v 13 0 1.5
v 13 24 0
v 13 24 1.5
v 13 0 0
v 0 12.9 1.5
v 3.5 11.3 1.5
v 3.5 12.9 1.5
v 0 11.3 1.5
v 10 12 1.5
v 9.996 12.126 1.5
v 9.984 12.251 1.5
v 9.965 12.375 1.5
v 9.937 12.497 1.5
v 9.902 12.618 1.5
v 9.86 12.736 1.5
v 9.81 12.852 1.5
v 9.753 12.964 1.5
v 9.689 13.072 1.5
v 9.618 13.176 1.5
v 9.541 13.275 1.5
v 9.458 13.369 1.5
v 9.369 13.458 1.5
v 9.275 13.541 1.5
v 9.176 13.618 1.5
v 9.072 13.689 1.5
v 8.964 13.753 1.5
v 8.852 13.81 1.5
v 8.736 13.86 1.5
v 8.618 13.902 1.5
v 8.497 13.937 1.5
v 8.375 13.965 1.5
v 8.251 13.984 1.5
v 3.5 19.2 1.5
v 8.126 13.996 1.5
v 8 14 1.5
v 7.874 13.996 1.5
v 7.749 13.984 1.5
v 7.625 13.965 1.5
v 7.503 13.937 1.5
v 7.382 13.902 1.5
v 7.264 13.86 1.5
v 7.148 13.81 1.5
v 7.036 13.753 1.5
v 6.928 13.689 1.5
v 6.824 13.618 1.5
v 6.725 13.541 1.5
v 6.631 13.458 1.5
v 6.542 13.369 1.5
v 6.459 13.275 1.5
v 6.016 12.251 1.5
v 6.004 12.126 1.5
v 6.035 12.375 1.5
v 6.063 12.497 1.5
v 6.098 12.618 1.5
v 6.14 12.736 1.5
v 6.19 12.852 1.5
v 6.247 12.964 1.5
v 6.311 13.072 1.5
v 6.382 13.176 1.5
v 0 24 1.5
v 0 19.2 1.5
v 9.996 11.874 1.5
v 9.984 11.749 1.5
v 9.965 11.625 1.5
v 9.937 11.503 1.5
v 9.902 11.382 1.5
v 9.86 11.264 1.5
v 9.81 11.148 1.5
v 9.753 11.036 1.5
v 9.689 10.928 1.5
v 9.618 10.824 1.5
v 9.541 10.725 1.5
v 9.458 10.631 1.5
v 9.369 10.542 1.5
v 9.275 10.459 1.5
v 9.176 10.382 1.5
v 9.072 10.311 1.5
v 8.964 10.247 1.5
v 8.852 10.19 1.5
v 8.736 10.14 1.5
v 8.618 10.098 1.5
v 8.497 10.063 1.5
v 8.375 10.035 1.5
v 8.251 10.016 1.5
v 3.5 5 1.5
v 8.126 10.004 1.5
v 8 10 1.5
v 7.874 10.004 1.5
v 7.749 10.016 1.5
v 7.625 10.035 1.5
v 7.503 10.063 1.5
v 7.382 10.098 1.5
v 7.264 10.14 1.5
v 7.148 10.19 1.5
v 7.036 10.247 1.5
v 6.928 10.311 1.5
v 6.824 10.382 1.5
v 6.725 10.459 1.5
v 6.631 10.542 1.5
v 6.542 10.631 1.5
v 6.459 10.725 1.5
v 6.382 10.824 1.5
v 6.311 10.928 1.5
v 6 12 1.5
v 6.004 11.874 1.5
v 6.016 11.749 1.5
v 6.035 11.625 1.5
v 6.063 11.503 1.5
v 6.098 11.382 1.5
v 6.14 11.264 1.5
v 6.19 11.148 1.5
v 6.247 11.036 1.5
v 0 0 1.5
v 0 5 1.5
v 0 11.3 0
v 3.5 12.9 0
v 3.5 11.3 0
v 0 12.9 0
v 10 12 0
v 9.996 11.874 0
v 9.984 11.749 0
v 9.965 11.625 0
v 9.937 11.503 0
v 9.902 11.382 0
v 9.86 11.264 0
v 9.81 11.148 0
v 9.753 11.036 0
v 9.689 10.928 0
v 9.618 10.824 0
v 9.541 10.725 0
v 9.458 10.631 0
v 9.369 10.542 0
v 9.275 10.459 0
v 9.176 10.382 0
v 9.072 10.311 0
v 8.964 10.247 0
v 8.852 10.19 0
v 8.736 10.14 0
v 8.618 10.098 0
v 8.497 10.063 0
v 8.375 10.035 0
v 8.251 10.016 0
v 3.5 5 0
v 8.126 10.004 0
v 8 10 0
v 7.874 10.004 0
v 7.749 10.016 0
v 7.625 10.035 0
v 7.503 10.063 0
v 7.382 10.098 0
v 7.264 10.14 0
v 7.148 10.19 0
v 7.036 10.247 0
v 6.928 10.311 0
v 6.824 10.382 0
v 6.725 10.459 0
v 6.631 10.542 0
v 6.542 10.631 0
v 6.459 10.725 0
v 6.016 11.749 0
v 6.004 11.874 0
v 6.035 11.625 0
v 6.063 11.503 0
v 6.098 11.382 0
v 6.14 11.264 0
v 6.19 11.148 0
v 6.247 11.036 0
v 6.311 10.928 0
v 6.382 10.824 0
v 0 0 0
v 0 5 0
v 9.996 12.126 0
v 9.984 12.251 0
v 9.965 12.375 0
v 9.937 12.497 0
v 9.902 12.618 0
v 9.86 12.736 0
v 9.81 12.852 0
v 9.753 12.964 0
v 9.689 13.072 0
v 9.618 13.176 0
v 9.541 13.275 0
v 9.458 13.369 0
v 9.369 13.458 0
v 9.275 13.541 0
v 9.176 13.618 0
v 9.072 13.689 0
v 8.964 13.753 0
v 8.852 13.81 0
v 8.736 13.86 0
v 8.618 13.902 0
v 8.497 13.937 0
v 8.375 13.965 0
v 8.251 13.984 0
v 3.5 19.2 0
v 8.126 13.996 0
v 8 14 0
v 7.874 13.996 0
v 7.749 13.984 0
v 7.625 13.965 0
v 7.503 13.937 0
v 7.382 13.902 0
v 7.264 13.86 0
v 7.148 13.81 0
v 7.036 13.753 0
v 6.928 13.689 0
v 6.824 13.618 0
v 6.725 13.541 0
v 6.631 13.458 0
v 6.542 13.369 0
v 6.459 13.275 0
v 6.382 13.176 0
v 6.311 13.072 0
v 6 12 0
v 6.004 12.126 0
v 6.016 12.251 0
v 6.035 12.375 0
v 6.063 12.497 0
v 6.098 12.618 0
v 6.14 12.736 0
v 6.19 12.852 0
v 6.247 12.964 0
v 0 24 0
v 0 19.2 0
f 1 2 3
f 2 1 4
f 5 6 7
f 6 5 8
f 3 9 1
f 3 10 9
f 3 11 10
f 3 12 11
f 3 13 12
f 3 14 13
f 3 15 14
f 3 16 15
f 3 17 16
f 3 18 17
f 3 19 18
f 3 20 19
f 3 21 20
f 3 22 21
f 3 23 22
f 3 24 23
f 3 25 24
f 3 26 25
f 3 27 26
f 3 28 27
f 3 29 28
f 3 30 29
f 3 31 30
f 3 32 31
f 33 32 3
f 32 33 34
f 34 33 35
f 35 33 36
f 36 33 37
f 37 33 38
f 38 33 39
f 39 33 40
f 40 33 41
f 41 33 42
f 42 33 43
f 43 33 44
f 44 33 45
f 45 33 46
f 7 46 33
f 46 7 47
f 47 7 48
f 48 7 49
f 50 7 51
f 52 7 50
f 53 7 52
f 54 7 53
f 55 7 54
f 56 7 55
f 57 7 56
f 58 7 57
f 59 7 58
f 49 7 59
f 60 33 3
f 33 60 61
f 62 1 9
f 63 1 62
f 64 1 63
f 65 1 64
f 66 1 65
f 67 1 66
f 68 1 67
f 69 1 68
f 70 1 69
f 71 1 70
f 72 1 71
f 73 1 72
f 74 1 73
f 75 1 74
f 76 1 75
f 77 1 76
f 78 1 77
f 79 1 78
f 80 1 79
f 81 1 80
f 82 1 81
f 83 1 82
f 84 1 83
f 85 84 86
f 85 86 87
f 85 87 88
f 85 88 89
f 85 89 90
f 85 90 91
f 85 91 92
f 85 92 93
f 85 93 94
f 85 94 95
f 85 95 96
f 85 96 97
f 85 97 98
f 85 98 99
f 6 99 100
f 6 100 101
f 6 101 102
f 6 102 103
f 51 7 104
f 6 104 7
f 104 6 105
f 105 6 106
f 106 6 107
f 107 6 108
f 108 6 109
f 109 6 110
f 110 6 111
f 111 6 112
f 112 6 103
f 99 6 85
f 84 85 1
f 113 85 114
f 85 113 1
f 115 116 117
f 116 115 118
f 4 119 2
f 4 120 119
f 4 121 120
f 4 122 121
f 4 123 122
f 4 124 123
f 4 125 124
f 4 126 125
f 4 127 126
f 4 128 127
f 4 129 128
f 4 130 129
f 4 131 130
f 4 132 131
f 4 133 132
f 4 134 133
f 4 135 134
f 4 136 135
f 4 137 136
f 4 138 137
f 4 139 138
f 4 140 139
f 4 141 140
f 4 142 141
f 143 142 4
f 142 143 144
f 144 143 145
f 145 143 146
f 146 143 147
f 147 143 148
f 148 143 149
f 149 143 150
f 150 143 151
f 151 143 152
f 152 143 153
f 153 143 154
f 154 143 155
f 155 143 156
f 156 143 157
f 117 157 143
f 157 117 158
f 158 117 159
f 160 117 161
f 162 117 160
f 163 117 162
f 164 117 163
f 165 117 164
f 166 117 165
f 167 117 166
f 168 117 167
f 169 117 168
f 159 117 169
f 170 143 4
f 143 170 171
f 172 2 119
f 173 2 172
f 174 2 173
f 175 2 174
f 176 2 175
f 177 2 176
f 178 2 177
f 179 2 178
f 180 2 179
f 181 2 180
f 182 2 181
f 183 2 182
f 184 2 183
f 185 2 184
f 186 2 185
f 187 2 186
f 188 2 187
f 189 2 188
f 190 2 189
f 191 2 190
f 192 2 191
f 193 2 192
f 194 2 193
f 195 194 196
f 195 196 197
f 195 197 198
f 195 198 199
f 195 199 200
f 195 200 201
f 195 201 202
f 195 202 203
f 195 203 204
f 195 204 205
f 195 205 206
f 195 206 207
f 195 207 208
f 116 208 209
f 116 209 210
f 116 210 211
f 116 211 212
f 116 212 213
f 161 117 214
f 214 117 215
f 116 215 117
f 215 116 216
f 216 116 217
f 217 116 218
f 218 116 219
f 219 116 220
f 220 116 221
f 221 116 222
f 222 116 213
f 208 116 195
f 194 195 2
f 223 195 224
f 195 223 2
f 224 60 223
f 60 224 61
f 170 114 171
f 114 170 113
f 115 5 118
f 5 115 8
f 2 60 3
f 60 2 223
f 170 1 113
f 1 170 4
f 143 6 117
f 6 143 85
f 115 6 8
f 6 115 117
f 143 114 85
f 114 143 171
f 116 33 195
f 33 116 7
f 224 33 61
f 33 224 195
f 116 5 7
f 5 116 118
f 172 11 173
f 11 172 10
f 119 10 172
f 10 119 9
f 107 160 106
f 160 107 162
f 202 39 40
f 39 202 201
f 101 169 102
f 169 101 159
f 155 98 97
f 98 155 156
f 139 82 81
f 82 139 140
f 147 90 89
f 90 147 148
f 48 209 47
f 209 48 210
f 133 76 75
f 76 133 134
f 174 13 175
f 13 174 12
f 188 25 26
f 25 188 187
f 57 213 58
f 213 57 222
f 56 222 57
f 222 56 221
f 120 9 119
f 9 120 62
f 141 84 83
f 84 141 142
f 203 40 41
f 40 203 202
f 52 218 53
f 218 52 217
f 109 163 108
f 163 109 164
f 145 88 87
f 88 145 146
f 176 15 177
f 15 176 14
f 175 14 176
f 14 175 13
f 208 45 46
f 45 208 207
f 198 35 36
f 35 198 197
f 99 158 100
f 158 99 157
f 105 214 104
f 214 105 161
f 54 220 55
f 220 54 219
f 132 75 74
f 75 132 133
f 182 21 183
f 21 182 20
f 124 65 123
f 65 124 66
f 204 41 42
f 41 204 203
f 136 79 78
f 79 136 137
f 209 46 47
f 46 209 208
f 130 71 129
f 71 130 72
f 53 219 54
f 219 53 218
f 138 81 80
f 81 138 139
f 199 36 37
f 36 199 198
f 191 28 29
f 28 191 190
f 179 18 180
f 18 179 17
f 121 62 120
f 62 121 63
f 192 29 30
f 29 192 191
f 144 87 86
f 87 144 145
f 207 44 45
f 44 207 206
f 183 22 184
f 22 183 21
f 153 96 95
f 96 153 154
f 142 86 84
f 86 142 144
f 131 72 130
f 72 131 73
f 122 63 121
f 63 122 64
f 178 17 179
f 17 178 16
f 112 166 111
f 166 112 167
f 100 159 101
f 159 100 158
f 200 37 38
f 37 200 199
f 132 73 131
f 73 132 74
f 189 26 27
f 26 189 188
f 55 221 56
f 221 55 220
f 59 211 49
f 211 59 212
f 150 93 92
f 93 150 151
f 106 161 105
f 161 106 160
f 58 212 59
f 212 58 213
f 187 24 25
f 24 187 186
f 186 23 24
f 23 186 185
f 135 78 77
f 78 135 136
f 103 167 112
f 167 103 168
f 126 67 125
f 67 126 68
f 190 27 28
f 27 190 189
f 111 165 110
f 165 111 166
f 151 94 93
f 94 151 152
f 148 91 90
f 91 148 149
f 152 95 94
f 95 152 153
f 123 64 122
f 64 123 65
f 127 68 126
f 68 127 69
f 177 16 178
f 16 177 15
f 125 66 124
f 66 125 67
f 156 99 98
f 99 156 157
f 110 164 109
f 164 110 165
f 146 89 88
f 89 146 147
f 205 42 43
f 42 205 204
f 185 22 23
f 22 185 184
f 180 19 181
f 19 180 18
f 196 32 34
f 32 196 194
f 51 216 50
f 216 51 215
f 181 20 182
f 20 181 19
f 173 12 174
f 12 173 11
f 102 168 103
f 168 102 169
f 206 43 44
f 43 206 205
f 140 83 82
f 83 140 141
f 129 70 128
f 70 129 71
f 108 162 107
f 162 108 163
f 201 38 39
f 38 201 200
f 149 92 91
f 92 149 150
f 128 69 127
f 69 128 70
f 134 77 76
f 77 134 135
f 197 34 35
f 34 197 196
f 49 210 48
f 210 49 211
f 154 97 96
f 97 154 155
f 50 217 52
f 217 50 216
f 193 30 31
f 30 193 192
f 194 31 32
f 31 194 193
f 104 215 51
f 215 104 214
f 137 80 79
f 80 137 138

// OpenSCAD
module single(){
	difference() {
	cube(size = [13,24,1.5], center = false);
	translate(v = [-0.5,5,-.5])
		cube(size = [4,6.3,3]);
	translate(v = [-0.5,12.9,-0.5])
		cube(size = [4,6.3,3]);
	translate(v = [8,12,1])	
		cylinder (h=3, r=2, center = true, $fn=100);
	}
}

single();
